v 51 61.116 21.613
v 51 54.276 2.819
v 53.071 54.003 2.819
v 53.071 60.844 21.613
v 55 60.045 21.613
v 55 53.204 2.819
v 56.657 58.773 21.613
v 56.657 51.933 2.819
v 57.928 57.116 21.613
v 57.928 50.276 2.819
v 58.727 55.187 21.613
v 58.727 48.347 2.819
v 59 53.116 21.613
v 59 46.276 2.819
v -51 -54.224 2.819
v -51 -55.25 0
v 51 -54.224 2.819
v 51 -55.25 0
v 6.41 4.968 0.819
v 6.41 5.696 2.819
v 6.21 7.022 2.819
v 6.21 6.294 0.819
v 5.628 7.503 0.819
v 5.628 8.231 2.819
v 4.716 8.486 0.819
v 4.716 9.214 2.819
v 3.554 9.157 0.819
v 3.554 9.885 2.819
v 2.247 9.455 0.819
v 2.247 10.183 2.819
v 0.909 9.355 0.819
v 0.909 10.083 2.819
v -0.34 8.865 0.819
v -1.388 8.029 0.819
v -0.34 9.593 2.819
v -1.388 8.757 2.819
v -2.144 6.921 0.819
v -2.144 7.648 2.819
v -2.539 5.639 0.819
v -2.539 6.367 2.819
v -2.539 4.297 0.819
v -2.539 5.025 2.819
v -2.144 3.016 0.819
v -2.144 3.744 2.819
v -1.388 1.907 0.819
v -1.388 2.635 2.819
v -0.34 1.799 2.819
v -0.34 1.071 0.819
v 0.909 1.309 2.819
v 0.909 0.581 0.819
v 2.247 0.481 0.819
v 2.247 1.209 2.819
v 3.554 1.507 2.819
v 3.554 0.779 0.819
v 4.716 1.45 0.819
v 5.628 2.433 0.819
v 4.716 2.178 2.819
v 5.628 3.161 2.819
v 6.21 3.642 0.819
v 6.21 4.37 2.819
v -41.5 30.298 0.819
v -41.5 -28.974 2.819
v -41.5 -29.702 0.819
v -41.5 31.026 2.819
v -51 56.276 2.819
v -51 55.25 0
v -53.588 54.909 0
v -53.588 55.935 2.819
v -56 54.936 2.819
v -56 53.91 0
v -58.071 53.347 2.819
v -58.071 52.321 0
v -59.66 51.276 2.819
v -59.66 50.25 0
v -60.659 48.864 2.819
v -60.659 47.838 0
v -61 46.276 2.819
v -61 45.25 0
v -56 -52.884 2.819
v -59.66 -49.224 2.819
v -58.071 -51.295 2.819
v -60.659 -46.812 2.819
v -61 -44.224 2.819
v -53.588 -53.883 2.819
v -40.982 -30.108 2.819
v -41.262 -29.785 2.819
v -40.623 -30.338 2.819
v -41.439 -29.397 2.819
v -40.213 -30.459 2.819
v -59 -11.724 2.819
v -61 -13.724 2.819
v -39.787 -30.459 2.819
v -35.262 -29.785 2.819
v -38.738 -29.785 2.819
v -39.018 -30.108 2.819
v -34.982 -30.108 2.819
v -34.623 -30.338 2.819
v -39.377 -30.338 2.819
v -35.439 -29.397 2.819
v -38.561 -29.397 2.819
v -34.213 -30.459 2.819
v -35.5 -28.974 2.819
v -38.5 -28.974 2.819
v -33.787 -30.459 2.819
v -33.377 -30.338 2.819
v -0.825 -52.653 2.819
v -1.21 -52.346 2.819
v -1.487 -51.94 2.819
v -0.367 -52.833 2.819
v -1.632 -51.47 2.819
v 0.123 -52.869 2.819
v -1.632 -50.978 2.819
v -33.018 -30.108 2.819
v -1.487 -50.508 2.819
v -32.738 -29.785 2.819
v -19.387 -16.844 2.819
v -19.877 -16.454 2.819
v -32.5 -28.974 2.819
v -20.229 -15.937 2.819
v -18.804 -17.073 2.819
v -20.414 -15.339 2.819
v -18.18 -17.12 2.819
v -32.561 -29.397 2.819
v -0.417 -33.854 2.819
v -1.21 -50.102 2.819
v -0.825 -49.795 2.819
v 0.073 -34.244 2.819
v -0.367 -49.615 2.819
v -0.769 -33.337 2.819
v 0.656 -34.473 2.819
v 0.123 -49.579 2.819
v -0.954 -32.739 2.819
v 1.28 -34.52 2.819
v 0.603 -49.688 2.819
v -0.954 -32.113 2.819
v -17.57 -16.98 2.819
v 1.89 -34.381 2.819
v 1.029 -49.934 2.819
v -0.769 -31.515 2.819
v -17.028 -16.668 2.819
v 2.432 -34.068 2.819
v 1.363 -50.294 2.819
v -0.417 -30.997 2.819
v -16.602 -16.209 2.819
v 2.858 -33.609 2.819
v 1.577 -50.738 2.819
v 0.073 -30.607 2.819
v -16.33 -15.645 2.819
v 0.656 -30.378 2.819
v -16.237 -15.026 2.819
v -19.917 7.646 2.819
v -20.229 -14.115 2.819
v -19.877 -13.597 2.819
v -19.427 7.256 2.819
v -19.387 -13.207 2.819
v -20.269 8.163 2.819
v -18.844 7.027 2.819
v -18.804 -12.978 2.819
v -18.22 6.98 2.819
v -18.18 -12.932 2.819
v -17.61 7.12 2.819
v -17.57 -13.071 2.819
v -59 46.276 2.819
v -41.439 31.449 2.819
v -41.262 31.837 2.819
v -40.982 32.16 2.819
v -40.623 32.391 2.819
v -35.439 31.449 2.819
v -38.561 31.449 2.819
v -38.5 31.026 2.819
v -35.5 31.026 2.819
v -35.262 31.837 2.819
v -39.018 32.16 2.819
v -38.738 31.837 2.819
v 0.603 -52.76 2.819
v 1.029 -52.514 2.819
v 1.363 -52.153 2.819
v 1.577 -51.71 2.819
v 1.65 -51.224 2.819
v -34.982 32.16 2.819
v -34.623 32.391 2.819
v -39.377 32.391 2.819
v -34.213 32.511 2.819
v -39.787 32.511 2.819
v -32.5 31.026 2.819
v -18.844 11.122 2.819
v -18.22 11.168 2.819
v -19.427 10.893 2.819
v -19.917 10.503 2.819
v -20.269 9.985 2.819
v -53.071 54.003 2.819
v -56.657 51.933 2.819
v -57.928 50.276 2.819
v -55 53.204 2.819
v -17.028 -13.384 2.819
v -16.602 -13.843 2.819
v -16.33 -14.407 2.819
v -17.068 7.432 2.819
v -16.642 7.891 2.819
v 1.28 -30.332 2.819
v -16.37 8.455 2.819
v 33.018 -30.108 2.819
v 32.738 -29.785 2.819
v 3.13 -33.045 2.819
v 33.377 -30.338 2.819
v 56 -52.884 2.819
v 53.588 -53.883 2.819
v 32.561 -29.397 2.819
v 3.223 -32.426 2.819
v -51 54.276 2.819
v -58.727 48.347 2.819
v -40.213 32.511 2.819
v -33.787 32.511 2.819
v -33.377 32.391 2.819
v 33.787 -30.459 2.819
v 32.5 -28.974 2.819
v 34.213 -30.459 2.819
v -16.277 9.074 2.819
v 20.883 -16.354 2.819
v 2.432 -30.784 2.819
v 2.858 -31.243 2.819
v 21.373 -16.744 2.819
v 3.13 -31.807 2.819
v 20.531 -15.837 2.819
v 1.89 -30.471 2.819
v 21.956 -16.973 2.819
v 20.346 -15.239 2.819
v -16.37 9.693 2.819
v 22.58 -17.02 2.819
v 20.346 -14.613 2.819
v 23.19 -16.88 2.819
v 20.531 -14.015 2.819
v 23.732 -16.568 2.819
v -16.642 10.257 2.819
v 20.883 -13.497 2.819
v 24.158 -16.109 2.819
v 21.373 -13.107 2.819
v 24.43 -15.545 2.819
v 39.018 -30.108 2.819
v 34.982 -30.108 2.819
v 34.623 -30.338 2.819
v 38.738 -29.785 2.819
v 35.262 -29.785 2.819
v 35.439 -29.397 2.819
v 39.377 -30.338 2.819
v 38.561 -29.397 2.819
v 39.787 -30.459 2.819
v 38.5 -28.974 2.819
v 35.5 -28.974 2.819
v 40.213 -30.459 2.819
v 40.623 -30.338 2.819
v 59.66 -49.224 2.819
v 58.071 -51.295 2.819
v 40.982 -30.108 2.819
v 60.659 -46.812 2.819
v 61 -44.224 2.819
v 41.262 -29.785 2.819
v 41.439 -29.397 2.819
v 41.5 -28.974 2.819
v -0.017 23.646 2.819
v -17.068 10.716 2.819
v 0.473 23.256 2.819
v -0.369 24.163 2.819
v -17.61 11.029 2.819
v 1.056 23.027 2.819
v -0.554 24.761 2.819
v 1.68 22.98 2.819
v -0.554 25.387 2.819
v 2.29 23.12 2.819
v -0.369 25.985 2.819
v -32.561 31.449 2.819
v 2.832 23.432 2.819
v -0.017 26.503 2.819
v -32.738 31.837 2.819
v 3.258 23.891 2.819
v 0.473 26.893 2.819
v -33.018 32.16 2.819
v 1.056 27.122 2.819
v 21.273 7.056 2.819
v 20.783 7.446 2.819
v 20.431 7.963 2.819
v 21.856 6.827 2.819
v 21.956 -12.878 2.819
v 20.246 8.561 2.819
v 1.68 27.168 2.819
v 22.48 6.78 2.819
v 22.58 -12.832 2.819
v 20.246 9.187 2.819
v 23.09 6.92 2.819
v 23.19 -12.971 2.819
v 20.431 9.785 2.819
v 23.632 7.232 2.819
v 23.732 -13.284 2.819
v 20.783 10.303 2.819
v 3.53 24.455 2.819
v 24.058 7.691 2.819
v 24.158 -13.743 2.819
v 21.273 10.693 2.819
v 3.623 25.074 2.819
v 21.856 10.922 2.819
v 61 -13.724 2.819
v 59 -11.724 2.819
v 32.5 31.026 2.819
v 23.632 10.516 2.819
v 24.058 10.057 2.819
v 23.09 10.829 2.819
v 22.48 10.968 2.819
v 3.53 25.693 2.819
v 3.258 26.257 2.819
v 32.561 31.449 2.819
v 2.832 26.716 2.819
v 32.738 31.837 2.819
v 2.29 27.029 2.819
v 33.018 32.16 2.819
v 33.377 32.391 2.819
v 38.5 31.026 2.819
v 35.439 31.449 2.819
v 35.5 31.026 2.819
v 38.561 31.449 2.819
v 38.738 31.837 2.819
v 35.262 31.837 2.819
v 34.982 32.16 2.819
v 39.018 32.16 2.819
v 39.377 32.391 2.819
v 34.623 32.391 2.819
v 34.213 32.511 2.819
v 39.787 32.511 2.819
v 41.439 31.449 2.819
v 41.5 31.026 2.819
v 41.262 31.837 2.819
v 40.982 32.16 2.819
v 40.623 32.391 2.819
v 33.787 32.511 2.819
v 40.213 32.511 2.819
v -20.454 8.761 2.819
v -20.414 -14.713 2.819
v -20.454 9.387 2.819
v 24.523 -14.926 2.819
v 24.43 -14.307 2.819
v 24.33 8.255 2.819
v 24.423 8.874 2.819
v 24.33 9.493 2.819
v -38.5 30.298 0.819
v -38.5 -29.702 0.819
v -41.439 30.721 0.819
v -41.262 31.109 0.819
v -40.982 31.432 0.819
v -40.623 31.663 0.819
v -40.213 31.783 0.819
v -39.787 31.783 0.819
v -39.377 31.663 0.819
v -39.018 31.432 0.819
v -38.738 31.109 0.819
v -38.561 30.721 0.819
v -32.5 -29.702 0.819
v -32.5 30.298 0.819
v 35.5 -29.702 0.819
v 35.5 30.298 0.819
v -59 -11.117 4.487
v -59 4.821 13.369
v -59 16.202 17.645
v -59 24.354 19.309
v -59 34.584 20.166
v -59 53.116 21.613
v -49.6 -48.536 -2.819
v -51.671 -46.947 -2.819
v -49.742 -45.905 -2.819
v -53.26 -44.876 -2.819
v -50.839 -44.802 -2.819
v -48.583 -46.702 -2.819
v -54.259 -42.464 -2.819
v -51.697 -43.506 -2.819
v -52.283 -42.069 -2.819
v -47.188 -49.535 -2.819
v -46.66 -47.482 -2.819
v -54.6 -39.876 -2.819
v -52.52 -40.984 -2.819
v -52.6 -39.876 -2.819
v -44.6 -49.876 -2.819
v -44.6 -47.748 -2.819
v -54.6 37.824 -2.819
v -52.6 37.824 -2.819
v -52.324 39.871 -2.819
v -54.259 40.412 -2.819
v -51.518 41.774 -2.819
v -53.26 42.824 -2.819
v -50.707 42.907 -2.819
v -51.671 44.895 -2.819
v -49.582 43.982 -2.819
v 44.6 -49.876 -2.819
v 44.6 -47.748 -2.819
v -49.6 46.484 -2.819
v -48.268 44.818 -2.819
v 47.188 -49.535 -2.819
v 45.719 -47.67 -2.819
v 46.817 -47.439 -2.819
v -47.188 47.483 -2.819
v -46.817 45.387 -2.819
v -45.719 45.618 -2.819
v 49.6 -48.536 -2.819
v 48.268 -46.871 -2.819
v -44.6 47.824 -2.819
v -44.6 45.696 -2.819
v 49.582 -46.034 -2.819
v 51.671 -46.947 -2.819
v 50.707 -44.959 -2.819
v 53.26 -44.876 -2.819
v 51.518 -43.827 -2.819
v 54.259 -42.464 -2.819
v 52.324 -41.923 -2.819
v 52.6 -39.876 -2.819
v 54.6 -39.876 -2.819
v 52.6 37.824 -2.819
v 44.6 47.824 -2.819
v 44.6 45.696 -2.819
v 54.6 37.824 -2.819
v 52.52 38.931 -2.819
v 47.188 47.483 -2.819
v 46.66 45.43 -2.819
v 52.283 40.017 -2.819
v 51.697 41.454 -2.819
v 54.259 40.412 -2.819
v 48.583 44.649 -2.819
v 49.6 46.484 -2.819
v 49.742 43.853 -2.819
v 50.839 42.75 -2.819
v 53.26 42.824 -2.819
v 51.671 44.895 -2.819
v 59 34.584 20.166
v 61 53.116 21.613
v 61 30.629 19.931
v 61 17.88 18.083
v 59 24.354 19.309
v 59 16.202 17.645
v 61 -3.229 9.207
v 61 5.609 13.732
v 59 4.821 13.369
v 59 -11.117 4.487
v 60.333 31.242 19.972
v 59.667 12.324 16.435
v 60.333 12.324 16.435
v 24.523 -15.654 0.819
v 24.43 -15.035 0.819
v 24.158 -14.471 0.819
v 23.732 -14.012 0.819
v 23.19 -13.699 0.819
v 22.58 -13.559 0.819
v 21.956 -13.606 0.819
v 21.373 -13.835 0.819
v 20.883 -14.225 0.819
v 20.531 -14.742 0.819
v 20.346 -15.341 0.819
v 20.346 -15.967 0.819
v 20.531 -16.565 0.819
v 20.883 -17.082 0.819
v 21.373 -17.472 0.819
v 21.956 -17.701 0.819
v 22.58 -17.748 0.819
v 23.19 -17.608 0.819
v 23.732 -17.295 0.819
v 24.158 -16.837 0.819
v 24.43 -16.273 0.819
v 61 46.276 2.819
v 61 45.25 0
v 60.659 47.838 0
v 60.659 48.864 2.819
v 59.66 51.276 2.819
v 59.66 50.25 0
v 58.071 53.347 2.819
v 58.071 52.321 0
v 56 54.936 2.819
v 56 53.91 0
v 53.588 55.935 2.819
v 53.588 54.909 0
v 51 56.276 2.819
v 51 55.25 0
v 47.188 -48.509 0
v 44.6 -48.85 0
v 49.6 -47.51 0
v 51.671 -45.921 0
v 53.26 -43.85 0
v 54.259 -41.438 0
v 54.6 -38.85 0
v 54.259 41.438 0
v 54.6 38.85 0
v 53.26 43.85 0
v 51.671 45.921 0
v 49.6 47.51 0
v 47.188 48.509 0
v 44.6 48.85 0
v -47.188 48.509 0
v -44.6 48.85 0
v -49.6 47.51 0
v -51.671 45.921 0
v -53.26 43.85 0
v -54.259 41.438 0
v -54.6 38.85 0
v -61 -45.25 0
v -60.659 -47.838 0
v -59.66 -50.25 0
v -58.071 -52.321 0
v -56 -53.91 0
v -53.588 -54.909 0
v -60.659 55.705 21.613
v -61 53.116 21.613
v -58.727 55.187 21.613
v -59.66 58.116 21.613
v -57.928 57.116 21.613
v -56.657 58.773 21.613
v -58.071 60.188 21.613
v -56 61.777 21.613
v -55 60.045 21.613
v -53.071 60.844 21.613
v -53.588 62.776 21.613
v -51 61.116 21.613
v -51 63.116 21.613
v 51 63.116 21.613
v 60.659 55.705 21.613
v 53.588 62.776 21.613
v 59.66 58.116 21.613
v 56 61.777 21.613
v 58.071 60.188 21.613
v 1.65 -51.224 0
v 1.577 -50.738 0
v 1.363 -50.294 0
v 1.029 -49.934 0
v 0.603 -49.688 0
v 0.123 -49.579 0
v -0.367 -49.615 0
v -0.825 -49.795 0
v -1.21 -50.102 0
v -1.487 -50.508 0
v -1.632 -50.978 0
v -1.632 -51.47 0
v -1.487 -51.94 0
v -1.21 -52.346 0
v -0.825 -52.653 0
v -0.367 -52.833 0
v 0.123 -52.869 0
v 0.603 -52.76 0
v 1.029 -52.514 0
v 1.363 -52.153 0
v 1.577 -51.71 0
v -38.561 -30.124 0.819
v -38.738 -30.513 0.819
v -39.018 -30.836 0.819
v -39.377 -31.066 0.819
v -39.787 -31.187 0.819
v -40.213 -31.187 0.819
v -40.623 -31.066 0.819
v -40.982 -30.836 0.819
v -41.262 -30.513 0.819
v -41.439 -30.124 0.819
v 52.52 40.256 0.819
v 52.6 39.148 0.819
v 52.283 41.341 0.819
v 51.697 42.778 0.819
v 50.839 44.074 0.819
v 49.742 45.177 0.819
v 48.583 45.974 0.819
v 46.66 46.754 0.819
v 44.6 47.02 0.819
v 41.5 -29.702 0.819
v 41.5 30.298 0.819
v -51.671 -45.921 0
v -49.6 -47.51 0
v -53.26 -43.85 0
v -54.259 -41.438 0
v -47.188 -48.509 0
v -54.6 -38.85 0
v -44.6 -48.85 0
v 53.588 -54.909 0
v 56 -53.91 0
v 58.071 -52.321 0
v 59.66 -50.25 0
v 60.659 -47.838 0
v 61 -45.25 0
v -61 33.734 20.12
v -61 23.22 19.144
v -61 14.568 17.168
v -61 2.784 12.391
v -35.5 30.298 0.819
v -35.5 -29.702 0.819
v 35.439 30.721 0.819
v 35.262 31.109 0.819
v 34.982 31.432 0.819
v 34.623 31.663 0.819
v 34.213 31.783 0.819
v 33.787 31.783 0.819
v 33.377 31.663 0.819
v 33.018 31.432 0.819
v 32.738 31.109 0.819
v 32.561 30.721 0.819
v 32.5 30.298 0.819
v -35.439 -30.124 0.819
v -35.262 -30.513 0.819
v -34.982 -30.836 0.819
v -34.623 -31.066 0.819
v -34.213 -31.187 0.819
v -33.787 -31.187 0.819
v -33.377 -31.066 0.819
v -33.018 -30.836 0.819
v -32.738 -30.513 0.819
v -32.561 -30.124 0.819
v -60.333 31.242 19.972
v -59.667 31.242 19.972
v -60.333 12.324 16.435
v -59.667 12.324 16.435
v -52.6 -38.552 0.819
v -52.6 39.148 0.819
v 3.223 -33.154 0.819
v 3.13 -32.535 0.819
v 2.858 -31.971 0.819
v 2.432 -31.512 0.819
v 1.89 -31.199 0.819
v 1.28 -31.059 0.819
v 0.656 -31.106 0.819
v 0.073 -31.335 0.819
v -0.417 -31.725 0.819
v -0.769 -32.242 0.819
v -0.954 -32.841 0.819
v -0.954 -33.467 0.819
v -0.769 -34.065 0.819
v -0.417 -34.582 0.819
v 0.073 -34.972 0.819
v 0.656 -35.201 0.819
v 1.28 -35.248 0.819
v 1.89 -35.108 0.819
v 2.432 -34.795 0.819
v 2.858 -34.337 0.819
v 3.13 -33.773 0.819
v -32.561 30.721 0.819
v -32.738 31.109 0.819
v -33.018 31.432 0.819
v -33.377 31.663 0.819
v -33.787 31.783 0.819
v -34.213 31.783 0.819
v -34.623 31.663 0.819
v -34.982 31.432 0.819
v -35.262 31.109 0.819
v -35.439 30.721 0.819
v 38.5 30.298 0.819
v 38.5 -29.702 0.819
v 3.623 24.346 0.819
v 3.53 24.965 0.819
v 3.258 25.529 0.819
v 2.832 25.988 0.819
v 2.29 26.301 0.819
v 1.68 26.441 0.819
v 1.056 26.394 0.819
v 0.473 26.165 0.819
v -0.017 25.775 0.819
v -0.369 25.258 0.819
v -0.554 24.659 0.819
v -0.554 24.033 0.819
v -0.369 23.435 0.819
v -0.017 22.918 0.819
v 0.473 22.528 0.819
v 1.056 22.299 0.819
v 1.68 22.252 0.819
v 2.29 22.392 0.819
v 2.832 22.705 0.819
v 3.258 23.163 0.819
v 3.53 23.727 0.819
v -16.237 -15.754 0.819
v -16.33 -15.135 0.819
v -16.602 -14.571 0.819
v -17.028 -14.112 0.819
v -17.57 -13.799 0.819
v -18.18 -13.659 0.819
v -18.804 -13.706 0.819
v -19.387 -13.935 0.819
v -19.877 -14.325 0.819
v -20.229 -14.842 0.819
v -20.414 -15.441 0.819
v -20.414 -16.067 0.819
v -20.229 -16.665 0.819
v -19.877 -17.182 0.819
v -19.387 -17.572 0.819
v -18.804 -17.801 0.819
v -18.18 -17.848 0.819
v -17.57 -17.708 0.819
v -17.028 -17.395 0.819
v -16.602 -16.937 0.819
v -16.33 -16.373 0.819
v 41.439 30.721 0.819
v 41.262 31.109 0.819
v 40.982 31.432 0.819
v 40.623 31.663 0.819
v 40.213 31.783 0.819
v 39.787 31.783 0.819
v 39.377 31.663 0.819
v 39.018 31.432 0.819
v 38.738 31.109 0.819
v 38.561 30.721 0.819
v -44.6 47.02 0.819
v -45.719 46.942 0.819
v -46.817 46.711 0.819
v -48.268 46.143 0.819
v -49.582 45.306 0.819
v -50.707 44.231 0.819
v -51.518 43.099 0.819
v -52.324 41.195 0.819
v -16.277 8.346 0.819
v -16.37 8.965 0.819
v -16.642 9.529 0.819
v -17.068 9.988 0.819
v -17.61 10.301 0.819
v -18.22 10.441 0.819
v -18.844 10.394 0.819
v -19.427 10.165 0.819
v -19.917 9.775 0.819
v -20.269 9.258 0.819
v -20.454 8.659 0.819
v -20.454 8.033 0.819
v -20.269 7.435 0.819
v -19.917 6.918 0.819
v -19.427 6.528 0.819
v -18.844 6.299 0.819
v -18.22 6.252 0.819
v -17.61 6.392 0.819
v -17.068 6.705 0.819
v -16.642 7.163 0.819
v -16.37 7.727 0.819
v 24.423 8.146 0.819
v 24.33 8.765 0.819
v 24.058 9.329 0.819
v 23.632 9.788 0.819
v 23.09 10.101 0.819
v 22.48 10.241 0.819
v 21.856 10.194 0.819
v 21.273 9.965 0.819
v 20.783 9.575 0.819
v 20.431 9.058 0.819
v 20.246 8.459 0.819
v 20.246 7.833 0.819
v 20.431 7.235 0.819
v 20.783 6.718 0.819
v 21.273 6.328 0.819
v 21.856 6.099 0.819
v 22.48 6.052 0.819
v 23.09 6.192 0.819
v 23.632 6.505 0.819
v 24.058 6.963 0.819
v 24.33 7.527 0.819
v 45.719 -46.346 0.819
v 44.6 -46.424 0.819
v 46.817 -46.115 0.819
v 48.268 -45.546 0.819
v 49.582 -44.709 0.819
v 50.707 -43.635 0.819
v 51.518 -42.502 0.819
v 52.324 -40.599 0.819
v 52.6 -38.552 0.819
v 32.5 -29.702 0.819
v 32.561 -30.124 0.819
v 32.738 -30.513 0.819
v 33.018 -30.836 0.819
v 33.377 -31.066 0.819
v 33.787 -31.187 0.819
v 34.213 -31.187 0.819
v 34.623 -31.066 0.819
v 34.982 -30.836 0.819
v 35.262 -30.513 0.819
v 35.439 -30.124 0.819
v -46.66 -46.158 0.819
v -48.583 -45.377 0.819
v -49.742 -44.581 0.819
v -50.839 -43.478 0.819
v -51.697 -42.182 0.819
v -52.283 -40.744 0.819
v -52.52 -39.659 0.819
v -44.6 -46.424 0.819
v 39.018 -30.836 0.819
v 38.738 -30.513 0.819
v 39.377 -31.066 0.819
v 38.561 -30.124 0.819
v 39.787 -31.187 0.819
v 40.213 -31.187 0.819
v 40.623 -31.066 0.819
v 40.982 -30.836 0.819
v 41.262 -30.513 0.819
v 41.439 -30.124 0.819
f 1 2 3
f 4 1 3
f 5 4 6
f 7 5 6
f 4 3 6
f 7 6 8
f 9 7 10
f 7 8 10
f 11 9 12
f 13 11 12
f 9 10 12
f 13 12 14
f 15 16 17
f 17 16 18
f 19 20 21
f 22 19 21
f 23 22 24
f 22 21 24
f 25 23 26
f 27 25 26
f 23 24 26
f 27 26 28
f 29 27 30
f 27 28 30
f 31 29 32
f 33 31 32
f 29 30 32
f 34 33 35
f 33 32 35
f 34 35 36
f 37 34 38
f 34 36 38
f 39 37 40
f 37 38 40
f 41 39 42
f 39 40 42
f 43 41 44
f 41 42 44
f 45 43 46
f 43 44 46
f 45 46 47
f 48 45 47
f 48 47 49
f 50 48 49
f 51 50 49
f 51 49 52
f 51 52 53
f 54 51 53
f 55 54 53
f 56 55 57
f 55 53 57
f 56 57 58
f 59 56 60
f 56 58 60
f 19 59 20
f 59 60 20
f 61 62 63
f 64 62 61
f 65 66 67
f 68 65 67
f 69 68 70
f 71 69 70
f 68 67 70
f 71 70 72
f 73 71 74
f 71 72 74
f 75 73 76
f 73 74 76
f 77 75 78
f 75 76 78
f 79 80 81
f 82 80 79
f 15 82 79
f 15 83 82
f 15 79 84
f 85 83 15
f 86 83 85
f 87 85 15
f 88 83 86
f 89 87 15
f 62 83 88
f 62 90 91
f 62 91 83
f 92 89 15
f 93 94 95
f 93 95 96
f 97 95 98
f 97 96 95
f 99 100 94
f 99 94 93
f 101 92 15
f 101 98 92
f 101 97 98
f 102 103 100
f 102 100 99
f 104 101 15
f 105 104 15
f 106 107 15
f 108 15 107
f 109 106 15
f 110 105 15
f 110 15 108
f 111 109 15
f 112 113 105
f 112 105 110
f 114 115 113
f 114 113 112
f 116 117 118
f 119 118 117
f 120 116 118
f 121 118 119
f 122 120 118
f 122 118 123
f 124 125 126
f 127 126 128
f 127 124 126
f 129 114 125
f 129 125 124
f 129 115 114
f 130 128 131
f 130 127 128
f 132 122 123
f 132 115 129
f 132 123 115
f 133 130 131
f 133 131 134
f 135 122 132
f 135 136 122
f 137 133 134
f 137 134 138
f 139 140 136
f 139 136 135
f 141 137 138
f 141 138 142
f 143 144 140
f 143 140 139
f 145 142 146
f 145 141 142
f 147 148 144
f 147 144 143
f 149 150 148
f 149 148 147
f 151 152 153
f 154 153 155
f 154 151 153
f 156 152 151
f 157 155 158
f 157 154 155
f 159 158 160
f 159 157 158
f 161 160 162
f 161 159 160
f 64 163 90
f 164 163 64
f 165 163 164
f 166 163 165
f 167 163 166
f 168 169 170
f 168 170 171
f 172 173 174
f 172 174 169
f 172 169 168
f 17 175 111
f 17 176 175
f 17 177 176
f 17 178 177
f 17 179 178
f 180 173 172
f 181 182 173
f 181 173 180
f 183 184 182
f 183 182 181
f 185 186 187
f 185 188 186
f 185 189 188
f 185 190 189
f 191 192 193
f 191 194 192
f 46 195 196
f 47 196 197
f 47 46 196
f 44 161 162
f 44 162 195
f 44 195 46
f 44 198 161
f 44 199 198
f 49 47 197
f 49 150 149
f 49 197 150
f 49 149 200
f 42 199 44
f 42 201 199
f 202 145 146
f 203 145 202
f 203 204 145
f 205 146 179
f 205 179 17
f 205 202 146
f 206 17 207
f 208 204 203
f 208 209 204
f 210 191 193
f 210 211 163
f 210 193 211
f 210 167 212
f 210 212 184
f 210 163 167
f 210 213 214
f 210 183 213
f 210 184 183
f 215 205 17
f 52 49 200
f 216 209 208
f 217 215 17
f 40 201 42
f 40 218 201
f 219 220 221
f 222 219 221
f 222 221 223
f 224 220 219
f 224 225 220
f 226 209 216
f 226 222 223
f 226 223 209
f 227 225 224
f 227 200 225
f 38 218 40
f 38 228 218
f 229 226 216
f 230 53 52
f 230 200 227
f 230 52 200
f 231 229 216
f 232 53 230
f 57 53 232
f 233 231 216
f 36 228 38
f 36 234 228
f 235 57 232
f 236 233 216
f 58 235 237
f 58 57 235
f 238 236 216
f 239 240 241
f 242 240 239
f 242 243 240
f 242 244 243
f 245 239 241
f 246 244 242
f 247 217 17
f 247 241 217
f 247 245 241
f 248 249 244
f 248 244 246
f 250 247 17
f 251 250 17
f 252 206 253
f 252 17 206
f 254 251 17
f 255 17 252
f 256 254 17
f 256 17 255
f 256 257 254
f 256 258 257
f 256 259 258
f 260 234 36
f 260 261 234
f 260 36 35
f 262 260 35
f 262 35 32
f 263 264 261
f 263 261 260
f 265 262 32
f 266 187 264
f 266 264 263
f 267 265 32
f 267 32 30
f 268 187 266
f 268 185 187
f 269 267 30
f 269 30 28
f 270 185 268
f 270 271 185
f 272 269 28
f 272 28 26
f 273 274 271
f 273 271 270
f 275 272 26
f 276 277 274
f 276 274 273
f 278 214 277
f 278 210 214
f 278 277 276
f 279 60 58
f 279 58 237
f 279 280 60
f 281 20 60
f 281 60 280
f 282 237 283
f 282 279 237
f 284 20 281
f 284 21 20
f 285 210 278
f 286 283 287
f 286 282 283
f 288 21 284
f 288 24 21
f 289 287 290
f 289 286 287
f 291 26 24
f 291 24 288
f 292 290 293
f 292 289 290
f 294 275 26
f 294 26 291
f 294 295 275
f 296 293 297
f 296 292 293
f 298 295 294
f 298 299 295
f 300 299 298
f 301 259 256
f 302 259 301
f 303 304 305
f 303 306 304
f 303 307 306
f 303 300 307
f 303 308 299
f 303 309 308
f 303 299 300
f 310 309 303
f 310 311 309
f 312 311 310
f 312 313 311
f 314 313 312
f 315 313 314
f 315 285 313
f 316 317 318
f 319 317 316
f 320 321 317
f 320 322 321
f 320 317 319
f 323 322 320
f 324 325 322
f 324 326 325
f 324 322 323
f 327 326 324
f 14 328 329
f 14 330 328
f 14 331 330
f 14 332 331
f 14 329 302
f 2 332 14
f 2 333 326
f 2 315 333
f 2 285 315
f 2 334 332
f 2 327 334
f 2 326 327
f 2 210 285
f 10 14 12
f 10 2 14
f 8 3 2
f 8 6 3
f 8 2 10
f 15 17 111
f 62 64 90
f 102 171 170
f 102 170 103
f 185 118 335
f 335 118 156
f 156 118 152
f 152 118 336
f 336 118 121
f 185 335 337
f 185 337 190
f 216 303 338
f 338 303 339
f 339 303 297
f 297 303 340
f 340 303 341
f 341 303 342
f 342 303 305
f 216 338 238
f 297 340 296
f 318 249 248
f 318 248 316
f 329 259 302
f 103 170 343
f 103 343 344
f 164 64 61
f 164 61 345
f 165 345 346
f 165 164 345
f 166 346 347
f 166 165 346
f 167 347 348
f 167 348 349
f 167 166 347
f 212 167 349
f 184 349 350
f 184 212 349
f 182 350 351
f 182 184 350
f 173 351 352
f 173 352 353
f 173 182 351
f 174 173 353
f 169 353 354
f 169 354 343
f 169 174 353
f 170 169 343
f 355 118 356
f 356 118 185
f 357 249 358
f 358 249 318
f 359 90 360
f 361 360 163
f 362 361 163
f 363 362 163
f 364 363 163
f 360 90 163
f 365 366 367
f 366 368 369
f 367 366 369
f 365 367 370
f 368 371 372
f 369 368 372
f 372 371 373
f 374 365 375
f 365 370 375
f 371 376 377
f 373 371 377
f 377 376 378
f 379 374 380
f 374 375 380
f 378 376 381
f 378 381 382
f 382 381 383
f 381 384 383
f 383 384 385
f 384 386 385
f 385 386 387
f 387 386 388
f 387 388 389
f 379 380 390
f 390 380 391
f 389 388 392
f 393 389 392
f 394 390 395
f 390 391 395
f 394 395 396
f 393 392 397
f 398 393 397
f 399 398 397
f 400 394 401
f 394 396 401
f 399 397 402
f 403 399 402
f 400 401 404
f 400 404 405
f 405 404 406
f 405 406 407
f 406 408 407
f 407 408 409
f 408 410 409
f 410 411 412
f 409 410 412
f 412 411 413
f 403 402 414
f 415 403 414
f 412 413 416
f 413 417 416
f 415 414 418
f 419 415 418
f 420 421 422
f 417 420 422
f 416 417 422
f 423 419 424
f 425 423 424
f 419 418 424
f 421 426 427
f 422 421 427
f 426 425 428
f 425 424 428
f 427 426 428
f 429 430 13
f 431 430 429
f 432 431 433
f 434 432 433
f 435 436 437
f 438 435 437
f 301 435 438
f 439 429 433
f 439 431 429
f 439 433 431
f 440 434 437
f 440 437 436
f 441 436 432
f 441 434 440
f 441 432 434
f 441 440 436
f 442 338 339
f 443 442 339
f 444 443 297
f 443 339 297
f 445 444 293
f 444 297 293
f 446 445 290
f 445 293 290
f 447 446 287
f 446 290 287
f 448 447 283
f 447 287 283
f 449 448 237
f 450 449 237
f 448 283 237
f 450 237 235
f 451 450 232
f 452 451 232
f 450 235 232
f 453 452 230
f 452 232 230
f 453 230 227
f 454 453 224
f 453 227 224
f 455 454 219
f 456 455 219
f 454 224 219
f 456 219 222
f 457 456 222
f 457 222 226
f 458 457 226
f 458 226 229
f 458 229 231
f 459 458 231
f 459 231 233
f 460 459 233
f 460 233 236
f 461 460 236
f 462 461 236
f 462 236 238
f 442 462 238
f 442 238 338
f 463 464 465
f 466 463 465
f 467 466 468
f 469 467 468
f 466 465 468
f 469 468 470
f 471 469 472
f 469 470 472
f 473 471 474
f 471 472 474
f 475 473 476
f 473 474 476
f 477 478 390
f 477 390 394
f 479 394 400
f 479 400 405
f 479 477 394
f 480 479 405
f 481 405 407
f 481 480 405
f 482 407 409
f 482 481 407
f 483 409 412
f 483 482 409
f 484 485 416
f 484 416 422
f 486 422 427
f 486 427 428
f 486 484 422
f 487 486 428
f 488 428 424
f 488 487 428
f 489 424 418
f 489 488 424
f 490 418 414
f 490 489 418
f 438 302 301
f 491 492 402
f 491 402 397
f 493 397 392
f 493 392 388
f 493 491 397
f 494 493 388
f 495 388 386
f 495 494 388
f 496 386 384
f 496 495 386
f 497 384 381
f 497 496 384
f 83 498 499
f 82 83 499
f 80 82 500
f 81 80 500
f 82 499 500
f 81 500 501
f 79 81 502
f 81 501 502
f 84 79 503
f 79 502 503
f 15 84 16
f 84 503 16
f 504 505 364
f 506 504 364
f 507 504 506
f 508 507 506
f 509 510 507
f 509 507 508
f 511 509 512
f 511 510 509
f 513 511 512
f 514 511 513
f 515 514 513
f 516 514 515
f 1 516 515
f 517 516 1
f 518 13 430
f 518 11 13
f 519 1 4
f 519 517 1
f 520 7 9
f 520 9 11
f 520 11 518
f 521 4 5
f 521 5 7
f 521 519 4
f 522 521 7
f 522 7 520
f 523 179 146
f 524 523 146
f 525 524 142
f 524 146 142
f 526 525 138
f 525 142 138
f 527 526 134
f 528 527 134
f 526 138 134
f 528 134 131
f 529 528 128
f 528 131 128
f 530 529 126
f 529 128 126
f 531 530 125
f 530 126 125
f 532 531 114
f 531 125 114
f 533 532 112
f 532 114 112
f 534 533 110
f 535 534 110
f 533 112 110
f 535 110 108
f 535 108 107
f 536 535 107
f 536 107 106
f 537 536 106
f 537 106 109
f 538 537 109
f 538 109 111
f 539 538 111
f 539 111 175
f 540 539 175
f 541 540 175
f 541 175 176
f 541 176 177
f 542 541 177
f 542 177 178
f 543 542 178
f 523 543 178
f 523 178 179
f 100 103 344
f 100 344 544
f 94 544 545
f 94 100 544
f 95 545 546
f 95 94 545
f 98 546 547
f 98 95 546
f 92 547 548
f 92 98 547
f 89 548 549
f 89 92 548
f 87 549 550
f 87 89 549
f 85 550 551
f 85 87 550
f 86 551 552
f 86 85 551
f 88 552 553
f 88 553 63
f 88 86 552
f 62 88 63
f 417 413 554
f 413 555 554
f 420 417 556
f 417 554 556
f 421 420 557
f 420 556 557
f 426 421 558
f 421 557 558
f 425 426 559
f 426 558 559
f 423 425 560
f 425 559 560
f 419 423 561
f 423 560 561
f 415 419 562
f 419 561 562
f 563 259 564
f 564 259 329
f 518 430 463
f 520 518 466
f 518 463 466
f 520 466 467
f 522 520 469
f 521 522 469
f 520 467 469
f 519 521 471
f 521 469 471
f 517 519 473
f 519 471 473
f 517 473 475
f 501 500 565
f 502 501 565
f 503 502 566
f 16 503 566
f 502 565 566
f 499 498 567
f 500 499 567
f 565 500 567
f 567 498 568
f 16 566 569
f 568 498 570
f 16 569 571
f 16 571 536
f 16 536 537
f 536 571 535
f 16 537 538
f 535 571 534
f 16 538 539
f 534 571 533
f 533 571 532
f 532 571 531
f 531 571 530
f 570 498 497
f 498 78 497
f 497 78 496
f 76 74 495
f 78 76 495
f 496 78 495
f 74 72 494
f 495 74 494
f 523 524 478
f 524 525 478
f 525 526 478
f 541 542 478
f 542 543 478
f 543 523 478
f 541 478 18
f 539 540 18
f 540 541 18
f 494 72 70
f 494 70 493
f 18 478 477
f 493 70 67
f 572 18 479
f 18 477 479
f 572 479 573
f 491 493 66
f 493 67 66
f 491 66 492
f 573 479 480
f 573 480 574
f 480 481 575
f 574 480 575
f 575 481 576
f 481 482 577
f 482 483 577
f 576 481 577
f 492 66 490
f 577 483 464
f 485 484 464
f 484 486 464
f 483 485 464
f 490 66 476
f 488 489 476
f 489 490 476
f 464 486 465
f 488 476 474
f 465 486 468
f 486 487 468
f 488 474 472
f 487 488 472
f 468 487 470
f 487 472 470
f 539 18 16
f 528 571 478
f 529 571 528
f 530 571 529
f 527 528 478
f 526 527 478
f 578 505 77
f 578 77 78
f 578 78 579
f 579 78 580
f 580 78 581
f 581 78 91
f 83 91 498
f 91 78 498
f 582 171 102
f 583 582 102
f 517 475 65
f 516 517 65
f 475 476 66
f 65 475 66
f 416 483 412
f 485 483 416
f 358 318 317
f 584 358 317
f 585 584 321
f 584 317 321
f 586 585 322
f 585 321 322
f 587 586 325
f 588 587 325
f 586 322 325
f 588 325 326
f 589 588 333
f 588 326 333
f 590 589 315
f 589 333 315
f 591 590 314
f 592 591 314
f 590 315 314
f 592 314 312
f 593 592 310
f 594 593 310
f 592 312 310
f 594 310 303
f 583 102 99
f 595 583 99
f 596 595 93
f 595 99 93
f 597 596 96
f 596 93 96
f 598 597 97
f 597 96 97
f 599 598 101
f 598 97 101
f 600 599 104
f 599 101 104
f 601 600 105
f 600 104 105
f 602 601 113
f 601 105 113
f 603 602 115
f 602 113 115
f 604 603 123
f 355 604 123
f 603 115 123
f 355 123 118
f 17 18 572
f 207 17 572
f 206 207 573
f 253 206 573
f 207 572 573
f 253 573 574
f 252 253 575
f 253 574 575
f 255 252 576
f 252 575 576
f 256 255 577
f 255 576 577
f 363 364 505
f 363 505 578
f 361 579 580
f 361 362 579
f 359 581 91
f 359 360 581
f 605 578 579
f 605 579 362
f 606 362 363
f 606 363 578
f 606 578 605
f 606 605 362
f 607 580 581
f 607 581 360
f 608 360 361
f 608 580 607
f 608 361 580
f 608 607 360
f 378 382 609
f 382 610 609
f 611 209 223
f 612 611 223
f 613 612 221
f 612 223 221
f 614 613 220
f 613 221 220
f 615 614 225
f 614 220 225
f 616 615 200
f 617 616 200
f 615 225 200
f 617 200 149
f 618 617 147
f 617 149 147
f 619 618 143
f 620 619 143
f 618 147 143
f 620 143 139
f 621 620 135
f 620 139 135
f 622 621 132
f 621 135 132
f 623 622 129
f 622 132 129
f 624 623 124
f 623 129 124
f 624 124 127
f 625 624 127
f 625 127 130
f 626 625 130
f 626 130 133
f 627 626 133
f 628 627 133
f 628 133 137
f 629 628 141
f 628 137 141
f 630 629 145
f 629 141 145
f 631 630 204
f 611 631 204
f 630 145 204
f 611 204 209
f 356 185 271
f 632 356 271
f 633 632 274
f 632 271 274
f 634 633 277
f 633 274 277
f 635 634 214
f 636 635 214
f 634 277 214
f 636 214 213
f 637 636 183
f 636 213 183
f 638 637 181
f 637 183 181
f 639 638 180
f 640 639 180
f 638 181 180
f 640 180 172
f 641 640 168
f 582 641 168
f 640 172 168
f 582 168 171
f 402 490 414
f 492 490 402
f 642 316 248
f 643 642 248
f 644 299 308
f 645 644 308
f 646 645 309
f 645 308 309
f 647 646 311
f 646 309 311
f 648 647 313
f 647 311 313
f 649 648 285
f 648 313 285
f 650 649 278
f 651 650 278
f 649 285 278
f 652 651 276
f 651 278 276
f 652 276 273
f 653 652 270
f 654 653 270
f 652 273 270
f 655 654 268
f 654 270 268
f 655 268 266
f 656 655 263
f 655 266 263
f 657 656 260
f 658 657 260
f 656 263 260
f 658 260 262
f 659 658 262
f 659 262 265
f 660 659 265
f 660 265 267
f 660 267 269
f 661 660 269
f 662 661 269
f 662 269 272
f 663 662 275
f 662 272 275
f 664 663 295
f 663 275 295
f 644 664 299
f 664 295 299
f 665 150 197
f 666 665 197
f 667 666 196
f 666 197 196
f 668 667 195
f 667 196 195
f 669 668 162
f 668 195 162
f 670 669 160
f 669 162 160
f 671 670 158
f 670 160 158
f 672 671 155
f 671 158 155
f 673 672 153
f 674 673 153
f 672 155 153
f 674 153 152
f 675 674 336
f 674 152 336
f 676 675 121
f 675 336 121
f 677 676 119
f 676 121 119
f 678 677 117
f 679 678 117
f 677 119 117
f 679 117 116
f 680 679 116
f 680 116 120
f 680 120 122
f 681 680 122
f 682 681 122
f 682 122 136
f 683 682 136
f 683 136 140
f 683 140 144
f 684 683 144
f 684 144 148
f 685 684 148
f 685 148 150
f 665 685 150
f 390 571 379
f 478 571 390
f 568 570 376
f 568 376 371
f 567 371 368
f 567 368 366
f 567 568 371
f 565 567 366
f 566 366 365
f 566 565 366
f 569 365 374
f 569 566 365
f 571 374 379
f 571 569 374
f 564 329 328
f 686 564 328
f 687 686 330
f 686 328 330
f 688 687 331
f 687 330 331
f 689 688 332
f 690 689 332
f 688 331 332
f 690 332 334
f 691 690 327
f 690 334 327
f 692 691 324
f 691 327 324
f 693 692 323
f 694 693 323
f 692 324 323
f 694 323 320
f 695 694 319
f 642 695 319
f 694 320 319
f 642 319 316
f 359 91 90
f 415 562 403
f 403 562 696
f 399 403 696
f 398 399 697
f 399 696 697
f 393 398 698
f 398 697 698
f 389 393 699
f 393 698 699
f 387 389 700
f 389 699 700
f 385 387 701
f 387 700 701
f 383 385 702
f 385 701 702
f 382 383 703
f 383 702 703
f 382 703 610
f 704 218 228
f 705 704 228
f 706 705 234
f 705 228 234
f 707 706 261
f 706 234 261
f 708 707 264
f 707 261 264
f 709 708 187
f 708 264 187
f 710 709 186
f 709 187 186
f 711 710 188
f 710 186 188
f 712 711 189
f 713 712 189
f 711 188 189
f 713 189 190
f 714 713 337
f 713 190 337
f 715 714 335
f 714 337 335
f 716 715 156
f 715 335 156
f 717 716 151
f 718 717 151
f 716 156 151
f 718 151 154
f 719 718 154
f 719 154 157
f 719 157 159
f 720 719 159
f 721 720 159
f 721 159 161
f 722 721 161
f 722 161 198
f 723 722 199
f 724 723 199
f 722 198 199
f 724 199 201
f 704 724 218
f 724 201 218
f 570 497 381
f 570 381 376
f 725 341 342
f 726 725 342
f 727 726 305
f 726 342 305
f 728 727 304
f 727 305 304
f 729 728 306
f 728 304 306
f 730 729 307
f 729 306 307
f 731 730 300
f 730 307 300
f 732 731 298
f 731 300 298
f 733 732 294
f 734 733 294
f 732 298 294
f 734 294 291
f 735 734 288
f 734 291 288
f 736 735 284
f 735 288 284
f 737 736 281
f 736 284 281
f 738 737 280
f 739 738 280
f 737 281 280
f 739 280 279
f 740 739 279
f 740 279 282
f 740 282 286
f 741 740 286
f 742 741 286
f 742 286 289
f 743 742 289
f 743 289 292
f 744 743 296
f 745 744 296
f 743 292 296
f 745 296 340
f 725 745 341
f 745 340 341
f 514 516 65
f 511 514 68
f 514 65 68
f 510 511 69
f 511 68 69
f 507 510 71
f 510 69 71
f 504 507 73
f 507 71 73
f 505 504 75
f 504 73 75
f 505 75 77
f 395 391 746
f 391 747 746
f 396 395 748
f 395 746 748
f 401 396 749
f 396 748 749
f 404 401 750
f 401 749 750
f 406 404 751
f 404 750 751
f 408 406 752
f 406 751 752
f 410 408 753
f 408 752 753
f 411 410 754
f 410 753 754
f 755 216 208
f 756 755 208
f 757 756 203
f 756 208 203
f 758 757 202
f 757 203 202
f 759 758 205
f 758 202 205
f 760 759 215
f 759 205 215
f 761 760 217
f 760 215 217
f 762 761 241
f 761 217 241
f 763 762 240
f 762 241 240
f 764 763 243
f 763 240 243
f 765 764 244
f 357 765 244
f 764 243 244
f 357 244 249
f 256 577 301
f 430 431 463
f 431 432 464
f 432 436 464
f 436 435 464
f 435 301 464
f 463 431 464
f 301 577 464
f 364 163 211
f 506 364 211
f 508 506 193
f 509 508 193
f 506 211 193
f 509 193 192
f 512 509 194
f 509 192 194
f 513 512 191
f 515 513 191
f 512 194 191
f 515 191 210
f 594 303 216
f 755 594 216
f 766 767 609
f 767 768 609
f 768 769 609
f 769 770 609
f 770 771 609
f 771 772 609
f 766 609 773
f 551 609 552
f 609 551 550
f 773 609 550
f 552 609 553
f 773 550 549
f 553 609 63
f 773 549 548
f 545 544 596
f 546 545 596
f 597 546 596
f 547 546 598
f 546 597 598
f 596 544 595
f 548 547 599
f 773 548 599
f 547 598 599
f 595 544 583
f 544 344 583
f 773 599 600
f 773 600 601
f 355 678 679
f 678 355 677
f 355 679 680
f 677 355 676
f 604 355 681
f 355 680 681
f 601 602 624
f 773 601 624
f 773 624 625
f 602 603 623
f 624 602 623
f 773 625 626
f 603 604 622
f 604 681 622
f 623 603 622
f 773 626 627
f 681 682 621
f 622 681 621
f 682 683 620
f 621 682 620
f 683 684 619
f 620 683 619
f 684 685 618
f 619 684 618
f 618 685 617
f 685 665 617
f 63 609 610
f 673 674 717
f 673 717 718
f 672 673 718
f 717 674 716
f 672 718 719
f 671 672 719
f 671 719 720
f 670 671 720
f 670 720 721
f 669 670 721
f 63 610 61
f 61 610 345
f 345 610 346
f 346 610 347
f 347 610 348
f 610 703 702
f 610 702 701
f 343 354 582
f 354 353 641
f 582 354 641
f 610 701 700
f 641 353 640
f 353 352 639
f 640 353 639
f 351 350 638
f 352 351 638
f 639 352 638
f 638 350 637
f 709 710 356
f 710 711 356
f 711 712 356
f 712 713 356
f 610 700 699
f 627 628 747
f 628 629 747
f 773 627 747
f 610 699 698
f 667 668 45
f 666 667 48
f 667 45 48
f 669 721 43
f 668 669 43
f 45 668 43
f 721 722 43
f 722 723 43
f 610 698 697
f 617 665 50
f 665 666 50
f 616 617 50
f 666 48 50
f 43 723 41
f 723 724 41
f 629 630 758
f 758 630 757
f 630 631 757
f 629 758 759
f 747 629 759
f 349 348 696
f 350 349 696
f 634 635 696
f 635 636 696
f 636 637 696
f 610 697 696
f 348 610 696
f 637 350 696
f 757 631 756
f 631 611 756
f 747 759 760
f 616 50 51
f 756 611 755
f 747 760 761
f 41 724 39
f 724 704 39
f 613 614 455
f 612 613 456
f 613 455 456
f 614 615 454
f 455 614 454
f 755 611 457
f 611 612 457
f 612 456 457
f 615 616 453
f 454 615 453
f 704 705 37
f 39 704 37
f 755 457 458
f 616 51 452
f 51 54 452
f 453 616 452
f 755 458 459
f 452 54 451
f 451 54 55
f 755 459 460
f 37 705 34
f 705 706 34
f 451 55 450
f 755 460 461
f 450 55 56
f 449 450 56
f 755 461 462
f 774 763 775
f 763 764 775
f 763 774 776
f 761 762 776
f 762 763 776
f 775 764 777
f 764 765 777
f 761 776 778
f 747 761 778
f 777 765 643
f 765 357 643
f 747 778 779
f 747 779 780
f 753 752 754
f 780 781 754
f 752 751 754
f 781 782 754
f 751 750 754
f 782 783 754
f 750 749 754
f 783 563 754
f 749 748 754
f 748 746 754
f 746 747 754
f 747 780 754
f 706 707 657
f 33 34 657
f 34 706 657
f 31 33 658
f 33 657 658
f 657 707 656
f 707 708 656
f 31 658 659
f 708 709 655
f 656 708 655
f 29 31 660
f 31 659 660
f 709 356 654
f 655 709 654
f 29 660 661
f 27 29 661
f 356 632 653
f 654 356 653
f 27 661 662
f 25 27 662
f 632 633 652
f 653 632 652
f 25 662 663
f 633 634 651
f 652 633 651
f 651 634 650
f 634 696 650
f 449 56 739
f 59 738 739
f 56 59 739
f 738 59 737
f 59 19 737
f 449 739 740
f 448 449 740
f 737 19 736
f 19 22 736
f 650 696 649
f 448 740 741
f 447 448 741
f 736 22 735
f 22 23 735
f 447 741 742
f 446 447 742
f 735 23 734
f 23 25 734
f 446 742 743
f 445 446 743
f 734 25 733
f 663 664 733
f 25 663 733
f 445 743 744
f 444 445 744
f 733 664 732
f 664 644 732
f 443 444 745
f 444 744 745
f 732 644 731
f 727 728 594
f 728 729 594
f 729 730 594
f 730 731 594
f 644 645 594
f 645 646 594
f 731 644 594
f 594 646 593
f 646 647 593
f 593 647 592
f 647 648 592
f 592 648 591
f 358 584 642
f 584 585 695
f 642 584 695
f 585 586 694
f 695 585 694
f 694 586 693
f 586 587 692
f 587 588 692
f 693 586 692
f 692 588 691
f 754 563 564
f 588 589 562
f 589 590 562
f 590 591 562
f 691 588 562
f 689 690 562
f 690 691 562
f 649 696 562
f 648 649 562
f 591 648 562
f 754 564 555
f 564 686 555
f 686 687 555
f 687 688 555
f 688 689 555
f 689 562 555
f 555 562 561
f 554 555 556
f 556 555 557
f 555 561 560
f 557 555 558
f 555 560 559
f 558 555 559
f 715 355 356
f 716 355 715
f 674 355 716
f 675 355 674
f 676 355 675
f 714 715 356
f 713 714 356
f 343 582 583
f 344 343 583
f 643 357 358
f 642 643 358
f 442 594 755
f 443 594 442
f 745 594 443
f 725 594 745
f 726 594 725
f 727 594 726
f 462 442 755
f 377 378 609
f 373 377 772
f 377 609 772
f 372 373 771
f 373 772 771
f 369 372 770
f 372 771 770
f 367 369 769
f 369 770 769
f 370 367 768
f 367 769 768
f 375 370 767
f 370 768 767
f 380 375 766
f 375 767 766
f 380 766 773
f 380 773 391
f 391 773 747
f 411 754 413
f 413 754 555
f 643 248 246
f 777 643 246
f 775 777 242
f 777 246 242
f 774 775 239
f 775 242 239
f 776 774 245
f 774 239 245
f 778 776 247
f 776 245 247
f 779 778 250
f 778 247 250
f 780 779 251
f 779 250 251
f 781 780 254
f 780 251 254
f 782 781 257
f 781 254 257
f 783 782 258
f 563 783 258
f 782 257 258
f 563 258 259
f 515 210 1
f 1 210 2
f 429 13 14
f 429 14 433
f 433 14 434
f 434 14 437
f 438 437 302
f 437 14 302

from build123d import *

# Parameters (mm, degrees)
SALIENTE_EXTRUIR1_DEPTH    = 3
SALIENTE_EXTRUIR2_DEPTH    = 3
VACIADO1_T                 = -2
CROQUIS2_R                 = 2.1
CROQUIS2_R_2               = 4.5
AGUJEROS_FRONTALES_DEPTH   = 2.128355545
SALIENTE_EXTRUIR3_DEPTH    = 20
CORTAR_EXTRUIR2_DEPTH      = 140.049655499
CORTAR_EXTRUIR2_DEPTH_BACK = 140.049655499
CORTAR_EXTRUIR3_REACH      = 91.766
CROQUIS6_R                 = 1.65


with BuildPart() as part:
    # Croquis1 → Saliente-Extruir1 (new, along a direction that is not the sketch's normal)
    with BuildSketch(Plane.XY):
        with BuildLine():
            Line((51, 55.25), (-51, 55.25))
            ThreePointArc((-51, 55.25), (-58.071067812, 52.321067812), (-61, 45.25))
            Line((-61, 45.25), (-61, 38.85))
            Line((-61, 38.85), (-61, -45.25))
            ThreePointArc((-61, -45.25), (-58.071067812, -52.321067812), (-51, -55.25))
            Line((-51, -55.25), (51, -55.25))
            ThreePointArc((51, -55.25), (58.071067812, -52.321067812), (61, -45.25))
            Line((61, -45.25), (61, 38.85))
            Line((61, 38.85), (61, 45.25))
            ThreePointArc((61, 45.25), (58.071067812, 52.321067812), (51, 55.25))
        make_face()
        with BuildLine():
            ThreePointArc((-54.6, -38.85), (-51.671067812, -45.921067812), (-44.6, -48.85))
            Line((-44.6, -48.85), (44.6, -48.85))
            ThreePointArc((44.6, -48.85), (51.671067812, -45.921067812), (54.6, -38.85))
            Line((54.6, -38.85), (54.6, 33.85))
            Line((54.6, 33.85), (54.6, 38.85))
            ThreePointArc((54.6, 38.85), (51.671067812, 45.921067812), (44.6, 48.85))
            Line((44.6, 48.85), (-44.6, 48.85))
            ThreePointArc((-44.6, 48.85), (-51.671067812, 45.921067812), (-54.6, 38.85))
            Line((-54.6, 38.85), (-54.6, 33.85))
            Line((-54.6, 33.85), (-54.6, -38.85))
        make_face(mode=Mode.SUBTRACT)
        with BuildLine():
            Line((-54.6, 33.85), (-54.6, -38.85))
            ThreePointArc((-54.6, -38.85), (-51.671067812, -45.921067812), (-44.6, -48.85))
            Line((-44.6, -48.85), (44.6, -48.85))
            ThreePointArc((44.6, -48.85), (51.671067812, -45.921067812), (54.6, -38.85))
            Line((54.6, -38.85), (54.6, 33.85))
            Line((54.6, 33.85), (54.6, 38.85))
            ThreePointArc((54.6, 38.85), (51.671067812, 45.921067812), (44.6, 48.85))
            Line((44.6, 48.85), (-44.6, 48.85))
            ThreePointArc((-44.6, 48.85), (-51.671067812, 45.921067812), (-54.6, 38.85))
            Line((-54.6, 38.85), (-54.6, 33.85))
        make_face()
    extrude(amount=SALIENTE_EXTRUIR1_DEPTH, dir=(0, 0.34202014332566943, 0.9396926207859081))

    # Croquis1<3> → Saliente-Extruir2 (add, along a direction that is not the sketch's normal)
    with BuildSketch(Plane.XY):
        with BuildLine():
            Line((-54.6, 33.85), (-54.6, -38.85))
            ThreePointArc((-54.6, -38.85), (-51.671067812, -45.921067812), (-44.6, -48.85))
            Line((-44.6, -48.85), (44.6, -48.85))
            ThreePointArc((44.6, -48.85), (51.671067812, -45.921067812), (54.6, -38.85))
            Line((54.6, -38.85), (54.6, 33.85))
            Line((54.6, 33.85), (54.6, 38.85))
            ThreePointArc((54.6, 38.85), (51.671067812, 45.921067812), (44.6, 48.85))
            Line((44.6, 48.85), (-44.6, 48.85))
            ThreePointArc((-44.6, 48.85), (-51.671067812, 45.921067812), (-54.6, 38.85))
            Line((-54.6, 38.85), (-54.6, 33.85))
        make_face()
    extrude(amount=-SALIENTE_EXTRUIR2_DEPTH, dir=(0, 0.34202014332566943, 0.9396926207859081))

    # Vaciado1
    vaciado1_openings = [part.faces().sort_by_distance(p)[0] for p in [
        (0, -1.02606043, -2.819077862),
    ]]
    offset(amount=VACIADO1_T, openings=vaciado1_openings, kind=Kind.INTERSECTION)

    # Croquis2 → agujeros_frontales (cut, along a direction that is not the sketch's normal)
    with BuildSketch(Plane.XY.offset(2.819077862)):
        with Locations((1.522820459, 25.074336596)):
            Circle(CROQUIS2_R)
        with Locations((22.322818653, 8.874338039)):
            Circle(CROQUIS2_R)
        with Locations((22.422820346, -14.925662509)):
            Circle(CROQUIS2_R)
        with Locations((1.122821138, -32.425665611)):
            Circle(CROQUIS2_R)
        with Locations((-18.337182685, -15.02566234)):
            Circle(CROQUIS2_R)
        with Locations((-18.377177401, 9.074337699)):
            Circle(CROQUIS2_R)
        with Locations((1.910269276, 5.696006038)):
            Circle(CROQUIS2_R_2)
        with BuildLine():
            Line((-41.5, -28.97393957), (-41.5, 31.02606043))
            ThreePointArc((-41.5, 31.02606043), (-40, 32.52606043), (-38.5, 31.02606043))
            Line((-38.5, 31.02606043), (-38.5, -28.97393957))
            ThreePointArc((-38.5, -28.97393957), (-40, -30.47393957), (-41.5, -28.97393957))
        make_face()
        with BuildLine():
            Line((-32.5, -28.97393957), (-32.5, 31.02606043))
            ThreePointArc((-32.5, 31.02606043), (-34, 32.52606043), (-35.5, 31.02606043))
            Line((-35.5, 31.02606043), (-35.5, -28.97393957))
            ThreePointArc((-35.5, -28.97393957), (-34, -30.47393957), (-32.5, -28.97393957))
        make_face()
        with BuildLine():
            Line((41.5, -28.97393957), (41.5, 31.02606043))
            ThreePointArc((41.5, 31.02606043), (40, 32.52606043), (38.5, 31.02606043))
            Line((38.5, 31.02606043), (38.5, -28.97393957))
            ThreePointArc((38.5, -28.97393957), (40, -30.47393957), (41.5, -28.97393957))
        make_face()
        with BuildLine():
            Line((35.5, -28.97393957), (35.5, 31.02606043))
            ThreePointArc((35.5, 31.02606043), (34, 32.52606043), (32.5, 31.02606043))
            Line((32.5, 31.02606043), (32.5, -28.97393957))
            ThreePointArc((32.5, -28.97393957), (34, -30.47393957), (35.5, -28.97393957))
        make_face()
    extrude(amount=-AGUJEROS_FRONTALES_DEPTH, dir=(0, 0.34202014332566943, 0.9396926207859081), mode=Mode.SUBTRACT)

    # Croquis4 → Saliente-Extruir3 (add, along a direction that is not the sketch's normal)
    with BuildSketch(Plane.XY.offset(2.819077862)):
        with BuildLine():
            ThreePointArc((61, 46.27606043), (58.071067812, 53.347128242), (51, 56.27606043))
            Line((51, 56.27606043), (0, 56.27606043))
            Line((0, 56.27606043), (0, 54.27606043))
            Line((0, 54.27606043), (51, 54.27606043))
            ThreePointArc((51, 54.27606043), (56.656854249, 51.932914679), (59, 46.27606043))
            Line((59, 46.27606043), (59, -11.72393957))
            Line((59, -11.72393957), (61, -13.72393957))
            Line((61, -13.72393957), (61, 46.27606043))
        make_face()
        with BuildLine():
            Line((0, 54.27606043), (0, 56.27606043))
            Line((0, 56.27606043), (-51, 56.27606043))
            ThreePointArc((-51, 56.27606043), (-58.071067812, 53.347128242), (-61, 46.27606043))
            Line((-61, 46.27606043), (-61, -11.72393957))
            Line((-61, -11.72393957), (-61, -13.72393957))
            Line((-61, -13.72393957), (-59, -11.72393957))
            Line((-59, -11.72393957), (-59, 46.27606043))
            ThreePointArc((-59, 46.27606043), (-56.656854249, 51.932914679), (-51, 54.27606043))
            Line((-51, 54.27606043), (0, 54.27606043))
        make_face()
    extrude(amount=SALIENTE_EXTRUIR3_DEPTH, dir=(0, 0.3420201433256695, 0.9396926207859082))

    # Croquis5 → Cortar-Extruir2 (cut, two sides)
    with BuildSketch(Plane(origin=(61, 0, 0), x_dir=(0, 0, -1), z_dir=(1, 0, 0))) as cortar_extruir2_sk:
        with BuildLine():
            Line((-21.612930278, 53.116463296), (-21.612930278, -13.72393957))
            Line((-21.612930278, -13.72393957), (-2.819077862, -13.72393957))
            add(Edge.make_bspline(
                [(-21.612930278, 53.116463296), (-18.192805265, 26.402020841), (-24.202213901, 19.250300864), (-2.819077862, -13.72393957)],
                knots=[0.10784476, 0.10784476, 0.10784476, 0.10784476, 1, 1, 1, 1], degree=3))
        make_face()
    extrude(amount=CORTAR_EXTRUIR2_DEPTH, mode=Mode.SUBTRACT)
    extrude(cortar_extruir2_sk.sketch, amount=-CORTAR_EXTRUIR2_DEPTH_BACK, mode=Mode.SUBTRACT)

    # Croquis6 → Cortar-Extruir3 (cut, up to next)
    with BuildSketch(Plane.XY.offset(2.819077862), mode=Mode.PRIVATE) as cortar_extruir3_sk1:
        with Locations((0, -51.22393957)):
            Circle(CROQUIS6_R)
    cortar_extruir3_tool1 = extrude(cortar_extruir3_sk1.sketch, amount=-CORTAR_EXTRUIR3_REACH, mode=Mode.PRIVATE) & part.part
    add(cortar_extruir3_tool1.solids().sort_by_distance((0, -51.22394, 2.819078))[0], mode=Mode.SUBTRACT)


solid = part.part
